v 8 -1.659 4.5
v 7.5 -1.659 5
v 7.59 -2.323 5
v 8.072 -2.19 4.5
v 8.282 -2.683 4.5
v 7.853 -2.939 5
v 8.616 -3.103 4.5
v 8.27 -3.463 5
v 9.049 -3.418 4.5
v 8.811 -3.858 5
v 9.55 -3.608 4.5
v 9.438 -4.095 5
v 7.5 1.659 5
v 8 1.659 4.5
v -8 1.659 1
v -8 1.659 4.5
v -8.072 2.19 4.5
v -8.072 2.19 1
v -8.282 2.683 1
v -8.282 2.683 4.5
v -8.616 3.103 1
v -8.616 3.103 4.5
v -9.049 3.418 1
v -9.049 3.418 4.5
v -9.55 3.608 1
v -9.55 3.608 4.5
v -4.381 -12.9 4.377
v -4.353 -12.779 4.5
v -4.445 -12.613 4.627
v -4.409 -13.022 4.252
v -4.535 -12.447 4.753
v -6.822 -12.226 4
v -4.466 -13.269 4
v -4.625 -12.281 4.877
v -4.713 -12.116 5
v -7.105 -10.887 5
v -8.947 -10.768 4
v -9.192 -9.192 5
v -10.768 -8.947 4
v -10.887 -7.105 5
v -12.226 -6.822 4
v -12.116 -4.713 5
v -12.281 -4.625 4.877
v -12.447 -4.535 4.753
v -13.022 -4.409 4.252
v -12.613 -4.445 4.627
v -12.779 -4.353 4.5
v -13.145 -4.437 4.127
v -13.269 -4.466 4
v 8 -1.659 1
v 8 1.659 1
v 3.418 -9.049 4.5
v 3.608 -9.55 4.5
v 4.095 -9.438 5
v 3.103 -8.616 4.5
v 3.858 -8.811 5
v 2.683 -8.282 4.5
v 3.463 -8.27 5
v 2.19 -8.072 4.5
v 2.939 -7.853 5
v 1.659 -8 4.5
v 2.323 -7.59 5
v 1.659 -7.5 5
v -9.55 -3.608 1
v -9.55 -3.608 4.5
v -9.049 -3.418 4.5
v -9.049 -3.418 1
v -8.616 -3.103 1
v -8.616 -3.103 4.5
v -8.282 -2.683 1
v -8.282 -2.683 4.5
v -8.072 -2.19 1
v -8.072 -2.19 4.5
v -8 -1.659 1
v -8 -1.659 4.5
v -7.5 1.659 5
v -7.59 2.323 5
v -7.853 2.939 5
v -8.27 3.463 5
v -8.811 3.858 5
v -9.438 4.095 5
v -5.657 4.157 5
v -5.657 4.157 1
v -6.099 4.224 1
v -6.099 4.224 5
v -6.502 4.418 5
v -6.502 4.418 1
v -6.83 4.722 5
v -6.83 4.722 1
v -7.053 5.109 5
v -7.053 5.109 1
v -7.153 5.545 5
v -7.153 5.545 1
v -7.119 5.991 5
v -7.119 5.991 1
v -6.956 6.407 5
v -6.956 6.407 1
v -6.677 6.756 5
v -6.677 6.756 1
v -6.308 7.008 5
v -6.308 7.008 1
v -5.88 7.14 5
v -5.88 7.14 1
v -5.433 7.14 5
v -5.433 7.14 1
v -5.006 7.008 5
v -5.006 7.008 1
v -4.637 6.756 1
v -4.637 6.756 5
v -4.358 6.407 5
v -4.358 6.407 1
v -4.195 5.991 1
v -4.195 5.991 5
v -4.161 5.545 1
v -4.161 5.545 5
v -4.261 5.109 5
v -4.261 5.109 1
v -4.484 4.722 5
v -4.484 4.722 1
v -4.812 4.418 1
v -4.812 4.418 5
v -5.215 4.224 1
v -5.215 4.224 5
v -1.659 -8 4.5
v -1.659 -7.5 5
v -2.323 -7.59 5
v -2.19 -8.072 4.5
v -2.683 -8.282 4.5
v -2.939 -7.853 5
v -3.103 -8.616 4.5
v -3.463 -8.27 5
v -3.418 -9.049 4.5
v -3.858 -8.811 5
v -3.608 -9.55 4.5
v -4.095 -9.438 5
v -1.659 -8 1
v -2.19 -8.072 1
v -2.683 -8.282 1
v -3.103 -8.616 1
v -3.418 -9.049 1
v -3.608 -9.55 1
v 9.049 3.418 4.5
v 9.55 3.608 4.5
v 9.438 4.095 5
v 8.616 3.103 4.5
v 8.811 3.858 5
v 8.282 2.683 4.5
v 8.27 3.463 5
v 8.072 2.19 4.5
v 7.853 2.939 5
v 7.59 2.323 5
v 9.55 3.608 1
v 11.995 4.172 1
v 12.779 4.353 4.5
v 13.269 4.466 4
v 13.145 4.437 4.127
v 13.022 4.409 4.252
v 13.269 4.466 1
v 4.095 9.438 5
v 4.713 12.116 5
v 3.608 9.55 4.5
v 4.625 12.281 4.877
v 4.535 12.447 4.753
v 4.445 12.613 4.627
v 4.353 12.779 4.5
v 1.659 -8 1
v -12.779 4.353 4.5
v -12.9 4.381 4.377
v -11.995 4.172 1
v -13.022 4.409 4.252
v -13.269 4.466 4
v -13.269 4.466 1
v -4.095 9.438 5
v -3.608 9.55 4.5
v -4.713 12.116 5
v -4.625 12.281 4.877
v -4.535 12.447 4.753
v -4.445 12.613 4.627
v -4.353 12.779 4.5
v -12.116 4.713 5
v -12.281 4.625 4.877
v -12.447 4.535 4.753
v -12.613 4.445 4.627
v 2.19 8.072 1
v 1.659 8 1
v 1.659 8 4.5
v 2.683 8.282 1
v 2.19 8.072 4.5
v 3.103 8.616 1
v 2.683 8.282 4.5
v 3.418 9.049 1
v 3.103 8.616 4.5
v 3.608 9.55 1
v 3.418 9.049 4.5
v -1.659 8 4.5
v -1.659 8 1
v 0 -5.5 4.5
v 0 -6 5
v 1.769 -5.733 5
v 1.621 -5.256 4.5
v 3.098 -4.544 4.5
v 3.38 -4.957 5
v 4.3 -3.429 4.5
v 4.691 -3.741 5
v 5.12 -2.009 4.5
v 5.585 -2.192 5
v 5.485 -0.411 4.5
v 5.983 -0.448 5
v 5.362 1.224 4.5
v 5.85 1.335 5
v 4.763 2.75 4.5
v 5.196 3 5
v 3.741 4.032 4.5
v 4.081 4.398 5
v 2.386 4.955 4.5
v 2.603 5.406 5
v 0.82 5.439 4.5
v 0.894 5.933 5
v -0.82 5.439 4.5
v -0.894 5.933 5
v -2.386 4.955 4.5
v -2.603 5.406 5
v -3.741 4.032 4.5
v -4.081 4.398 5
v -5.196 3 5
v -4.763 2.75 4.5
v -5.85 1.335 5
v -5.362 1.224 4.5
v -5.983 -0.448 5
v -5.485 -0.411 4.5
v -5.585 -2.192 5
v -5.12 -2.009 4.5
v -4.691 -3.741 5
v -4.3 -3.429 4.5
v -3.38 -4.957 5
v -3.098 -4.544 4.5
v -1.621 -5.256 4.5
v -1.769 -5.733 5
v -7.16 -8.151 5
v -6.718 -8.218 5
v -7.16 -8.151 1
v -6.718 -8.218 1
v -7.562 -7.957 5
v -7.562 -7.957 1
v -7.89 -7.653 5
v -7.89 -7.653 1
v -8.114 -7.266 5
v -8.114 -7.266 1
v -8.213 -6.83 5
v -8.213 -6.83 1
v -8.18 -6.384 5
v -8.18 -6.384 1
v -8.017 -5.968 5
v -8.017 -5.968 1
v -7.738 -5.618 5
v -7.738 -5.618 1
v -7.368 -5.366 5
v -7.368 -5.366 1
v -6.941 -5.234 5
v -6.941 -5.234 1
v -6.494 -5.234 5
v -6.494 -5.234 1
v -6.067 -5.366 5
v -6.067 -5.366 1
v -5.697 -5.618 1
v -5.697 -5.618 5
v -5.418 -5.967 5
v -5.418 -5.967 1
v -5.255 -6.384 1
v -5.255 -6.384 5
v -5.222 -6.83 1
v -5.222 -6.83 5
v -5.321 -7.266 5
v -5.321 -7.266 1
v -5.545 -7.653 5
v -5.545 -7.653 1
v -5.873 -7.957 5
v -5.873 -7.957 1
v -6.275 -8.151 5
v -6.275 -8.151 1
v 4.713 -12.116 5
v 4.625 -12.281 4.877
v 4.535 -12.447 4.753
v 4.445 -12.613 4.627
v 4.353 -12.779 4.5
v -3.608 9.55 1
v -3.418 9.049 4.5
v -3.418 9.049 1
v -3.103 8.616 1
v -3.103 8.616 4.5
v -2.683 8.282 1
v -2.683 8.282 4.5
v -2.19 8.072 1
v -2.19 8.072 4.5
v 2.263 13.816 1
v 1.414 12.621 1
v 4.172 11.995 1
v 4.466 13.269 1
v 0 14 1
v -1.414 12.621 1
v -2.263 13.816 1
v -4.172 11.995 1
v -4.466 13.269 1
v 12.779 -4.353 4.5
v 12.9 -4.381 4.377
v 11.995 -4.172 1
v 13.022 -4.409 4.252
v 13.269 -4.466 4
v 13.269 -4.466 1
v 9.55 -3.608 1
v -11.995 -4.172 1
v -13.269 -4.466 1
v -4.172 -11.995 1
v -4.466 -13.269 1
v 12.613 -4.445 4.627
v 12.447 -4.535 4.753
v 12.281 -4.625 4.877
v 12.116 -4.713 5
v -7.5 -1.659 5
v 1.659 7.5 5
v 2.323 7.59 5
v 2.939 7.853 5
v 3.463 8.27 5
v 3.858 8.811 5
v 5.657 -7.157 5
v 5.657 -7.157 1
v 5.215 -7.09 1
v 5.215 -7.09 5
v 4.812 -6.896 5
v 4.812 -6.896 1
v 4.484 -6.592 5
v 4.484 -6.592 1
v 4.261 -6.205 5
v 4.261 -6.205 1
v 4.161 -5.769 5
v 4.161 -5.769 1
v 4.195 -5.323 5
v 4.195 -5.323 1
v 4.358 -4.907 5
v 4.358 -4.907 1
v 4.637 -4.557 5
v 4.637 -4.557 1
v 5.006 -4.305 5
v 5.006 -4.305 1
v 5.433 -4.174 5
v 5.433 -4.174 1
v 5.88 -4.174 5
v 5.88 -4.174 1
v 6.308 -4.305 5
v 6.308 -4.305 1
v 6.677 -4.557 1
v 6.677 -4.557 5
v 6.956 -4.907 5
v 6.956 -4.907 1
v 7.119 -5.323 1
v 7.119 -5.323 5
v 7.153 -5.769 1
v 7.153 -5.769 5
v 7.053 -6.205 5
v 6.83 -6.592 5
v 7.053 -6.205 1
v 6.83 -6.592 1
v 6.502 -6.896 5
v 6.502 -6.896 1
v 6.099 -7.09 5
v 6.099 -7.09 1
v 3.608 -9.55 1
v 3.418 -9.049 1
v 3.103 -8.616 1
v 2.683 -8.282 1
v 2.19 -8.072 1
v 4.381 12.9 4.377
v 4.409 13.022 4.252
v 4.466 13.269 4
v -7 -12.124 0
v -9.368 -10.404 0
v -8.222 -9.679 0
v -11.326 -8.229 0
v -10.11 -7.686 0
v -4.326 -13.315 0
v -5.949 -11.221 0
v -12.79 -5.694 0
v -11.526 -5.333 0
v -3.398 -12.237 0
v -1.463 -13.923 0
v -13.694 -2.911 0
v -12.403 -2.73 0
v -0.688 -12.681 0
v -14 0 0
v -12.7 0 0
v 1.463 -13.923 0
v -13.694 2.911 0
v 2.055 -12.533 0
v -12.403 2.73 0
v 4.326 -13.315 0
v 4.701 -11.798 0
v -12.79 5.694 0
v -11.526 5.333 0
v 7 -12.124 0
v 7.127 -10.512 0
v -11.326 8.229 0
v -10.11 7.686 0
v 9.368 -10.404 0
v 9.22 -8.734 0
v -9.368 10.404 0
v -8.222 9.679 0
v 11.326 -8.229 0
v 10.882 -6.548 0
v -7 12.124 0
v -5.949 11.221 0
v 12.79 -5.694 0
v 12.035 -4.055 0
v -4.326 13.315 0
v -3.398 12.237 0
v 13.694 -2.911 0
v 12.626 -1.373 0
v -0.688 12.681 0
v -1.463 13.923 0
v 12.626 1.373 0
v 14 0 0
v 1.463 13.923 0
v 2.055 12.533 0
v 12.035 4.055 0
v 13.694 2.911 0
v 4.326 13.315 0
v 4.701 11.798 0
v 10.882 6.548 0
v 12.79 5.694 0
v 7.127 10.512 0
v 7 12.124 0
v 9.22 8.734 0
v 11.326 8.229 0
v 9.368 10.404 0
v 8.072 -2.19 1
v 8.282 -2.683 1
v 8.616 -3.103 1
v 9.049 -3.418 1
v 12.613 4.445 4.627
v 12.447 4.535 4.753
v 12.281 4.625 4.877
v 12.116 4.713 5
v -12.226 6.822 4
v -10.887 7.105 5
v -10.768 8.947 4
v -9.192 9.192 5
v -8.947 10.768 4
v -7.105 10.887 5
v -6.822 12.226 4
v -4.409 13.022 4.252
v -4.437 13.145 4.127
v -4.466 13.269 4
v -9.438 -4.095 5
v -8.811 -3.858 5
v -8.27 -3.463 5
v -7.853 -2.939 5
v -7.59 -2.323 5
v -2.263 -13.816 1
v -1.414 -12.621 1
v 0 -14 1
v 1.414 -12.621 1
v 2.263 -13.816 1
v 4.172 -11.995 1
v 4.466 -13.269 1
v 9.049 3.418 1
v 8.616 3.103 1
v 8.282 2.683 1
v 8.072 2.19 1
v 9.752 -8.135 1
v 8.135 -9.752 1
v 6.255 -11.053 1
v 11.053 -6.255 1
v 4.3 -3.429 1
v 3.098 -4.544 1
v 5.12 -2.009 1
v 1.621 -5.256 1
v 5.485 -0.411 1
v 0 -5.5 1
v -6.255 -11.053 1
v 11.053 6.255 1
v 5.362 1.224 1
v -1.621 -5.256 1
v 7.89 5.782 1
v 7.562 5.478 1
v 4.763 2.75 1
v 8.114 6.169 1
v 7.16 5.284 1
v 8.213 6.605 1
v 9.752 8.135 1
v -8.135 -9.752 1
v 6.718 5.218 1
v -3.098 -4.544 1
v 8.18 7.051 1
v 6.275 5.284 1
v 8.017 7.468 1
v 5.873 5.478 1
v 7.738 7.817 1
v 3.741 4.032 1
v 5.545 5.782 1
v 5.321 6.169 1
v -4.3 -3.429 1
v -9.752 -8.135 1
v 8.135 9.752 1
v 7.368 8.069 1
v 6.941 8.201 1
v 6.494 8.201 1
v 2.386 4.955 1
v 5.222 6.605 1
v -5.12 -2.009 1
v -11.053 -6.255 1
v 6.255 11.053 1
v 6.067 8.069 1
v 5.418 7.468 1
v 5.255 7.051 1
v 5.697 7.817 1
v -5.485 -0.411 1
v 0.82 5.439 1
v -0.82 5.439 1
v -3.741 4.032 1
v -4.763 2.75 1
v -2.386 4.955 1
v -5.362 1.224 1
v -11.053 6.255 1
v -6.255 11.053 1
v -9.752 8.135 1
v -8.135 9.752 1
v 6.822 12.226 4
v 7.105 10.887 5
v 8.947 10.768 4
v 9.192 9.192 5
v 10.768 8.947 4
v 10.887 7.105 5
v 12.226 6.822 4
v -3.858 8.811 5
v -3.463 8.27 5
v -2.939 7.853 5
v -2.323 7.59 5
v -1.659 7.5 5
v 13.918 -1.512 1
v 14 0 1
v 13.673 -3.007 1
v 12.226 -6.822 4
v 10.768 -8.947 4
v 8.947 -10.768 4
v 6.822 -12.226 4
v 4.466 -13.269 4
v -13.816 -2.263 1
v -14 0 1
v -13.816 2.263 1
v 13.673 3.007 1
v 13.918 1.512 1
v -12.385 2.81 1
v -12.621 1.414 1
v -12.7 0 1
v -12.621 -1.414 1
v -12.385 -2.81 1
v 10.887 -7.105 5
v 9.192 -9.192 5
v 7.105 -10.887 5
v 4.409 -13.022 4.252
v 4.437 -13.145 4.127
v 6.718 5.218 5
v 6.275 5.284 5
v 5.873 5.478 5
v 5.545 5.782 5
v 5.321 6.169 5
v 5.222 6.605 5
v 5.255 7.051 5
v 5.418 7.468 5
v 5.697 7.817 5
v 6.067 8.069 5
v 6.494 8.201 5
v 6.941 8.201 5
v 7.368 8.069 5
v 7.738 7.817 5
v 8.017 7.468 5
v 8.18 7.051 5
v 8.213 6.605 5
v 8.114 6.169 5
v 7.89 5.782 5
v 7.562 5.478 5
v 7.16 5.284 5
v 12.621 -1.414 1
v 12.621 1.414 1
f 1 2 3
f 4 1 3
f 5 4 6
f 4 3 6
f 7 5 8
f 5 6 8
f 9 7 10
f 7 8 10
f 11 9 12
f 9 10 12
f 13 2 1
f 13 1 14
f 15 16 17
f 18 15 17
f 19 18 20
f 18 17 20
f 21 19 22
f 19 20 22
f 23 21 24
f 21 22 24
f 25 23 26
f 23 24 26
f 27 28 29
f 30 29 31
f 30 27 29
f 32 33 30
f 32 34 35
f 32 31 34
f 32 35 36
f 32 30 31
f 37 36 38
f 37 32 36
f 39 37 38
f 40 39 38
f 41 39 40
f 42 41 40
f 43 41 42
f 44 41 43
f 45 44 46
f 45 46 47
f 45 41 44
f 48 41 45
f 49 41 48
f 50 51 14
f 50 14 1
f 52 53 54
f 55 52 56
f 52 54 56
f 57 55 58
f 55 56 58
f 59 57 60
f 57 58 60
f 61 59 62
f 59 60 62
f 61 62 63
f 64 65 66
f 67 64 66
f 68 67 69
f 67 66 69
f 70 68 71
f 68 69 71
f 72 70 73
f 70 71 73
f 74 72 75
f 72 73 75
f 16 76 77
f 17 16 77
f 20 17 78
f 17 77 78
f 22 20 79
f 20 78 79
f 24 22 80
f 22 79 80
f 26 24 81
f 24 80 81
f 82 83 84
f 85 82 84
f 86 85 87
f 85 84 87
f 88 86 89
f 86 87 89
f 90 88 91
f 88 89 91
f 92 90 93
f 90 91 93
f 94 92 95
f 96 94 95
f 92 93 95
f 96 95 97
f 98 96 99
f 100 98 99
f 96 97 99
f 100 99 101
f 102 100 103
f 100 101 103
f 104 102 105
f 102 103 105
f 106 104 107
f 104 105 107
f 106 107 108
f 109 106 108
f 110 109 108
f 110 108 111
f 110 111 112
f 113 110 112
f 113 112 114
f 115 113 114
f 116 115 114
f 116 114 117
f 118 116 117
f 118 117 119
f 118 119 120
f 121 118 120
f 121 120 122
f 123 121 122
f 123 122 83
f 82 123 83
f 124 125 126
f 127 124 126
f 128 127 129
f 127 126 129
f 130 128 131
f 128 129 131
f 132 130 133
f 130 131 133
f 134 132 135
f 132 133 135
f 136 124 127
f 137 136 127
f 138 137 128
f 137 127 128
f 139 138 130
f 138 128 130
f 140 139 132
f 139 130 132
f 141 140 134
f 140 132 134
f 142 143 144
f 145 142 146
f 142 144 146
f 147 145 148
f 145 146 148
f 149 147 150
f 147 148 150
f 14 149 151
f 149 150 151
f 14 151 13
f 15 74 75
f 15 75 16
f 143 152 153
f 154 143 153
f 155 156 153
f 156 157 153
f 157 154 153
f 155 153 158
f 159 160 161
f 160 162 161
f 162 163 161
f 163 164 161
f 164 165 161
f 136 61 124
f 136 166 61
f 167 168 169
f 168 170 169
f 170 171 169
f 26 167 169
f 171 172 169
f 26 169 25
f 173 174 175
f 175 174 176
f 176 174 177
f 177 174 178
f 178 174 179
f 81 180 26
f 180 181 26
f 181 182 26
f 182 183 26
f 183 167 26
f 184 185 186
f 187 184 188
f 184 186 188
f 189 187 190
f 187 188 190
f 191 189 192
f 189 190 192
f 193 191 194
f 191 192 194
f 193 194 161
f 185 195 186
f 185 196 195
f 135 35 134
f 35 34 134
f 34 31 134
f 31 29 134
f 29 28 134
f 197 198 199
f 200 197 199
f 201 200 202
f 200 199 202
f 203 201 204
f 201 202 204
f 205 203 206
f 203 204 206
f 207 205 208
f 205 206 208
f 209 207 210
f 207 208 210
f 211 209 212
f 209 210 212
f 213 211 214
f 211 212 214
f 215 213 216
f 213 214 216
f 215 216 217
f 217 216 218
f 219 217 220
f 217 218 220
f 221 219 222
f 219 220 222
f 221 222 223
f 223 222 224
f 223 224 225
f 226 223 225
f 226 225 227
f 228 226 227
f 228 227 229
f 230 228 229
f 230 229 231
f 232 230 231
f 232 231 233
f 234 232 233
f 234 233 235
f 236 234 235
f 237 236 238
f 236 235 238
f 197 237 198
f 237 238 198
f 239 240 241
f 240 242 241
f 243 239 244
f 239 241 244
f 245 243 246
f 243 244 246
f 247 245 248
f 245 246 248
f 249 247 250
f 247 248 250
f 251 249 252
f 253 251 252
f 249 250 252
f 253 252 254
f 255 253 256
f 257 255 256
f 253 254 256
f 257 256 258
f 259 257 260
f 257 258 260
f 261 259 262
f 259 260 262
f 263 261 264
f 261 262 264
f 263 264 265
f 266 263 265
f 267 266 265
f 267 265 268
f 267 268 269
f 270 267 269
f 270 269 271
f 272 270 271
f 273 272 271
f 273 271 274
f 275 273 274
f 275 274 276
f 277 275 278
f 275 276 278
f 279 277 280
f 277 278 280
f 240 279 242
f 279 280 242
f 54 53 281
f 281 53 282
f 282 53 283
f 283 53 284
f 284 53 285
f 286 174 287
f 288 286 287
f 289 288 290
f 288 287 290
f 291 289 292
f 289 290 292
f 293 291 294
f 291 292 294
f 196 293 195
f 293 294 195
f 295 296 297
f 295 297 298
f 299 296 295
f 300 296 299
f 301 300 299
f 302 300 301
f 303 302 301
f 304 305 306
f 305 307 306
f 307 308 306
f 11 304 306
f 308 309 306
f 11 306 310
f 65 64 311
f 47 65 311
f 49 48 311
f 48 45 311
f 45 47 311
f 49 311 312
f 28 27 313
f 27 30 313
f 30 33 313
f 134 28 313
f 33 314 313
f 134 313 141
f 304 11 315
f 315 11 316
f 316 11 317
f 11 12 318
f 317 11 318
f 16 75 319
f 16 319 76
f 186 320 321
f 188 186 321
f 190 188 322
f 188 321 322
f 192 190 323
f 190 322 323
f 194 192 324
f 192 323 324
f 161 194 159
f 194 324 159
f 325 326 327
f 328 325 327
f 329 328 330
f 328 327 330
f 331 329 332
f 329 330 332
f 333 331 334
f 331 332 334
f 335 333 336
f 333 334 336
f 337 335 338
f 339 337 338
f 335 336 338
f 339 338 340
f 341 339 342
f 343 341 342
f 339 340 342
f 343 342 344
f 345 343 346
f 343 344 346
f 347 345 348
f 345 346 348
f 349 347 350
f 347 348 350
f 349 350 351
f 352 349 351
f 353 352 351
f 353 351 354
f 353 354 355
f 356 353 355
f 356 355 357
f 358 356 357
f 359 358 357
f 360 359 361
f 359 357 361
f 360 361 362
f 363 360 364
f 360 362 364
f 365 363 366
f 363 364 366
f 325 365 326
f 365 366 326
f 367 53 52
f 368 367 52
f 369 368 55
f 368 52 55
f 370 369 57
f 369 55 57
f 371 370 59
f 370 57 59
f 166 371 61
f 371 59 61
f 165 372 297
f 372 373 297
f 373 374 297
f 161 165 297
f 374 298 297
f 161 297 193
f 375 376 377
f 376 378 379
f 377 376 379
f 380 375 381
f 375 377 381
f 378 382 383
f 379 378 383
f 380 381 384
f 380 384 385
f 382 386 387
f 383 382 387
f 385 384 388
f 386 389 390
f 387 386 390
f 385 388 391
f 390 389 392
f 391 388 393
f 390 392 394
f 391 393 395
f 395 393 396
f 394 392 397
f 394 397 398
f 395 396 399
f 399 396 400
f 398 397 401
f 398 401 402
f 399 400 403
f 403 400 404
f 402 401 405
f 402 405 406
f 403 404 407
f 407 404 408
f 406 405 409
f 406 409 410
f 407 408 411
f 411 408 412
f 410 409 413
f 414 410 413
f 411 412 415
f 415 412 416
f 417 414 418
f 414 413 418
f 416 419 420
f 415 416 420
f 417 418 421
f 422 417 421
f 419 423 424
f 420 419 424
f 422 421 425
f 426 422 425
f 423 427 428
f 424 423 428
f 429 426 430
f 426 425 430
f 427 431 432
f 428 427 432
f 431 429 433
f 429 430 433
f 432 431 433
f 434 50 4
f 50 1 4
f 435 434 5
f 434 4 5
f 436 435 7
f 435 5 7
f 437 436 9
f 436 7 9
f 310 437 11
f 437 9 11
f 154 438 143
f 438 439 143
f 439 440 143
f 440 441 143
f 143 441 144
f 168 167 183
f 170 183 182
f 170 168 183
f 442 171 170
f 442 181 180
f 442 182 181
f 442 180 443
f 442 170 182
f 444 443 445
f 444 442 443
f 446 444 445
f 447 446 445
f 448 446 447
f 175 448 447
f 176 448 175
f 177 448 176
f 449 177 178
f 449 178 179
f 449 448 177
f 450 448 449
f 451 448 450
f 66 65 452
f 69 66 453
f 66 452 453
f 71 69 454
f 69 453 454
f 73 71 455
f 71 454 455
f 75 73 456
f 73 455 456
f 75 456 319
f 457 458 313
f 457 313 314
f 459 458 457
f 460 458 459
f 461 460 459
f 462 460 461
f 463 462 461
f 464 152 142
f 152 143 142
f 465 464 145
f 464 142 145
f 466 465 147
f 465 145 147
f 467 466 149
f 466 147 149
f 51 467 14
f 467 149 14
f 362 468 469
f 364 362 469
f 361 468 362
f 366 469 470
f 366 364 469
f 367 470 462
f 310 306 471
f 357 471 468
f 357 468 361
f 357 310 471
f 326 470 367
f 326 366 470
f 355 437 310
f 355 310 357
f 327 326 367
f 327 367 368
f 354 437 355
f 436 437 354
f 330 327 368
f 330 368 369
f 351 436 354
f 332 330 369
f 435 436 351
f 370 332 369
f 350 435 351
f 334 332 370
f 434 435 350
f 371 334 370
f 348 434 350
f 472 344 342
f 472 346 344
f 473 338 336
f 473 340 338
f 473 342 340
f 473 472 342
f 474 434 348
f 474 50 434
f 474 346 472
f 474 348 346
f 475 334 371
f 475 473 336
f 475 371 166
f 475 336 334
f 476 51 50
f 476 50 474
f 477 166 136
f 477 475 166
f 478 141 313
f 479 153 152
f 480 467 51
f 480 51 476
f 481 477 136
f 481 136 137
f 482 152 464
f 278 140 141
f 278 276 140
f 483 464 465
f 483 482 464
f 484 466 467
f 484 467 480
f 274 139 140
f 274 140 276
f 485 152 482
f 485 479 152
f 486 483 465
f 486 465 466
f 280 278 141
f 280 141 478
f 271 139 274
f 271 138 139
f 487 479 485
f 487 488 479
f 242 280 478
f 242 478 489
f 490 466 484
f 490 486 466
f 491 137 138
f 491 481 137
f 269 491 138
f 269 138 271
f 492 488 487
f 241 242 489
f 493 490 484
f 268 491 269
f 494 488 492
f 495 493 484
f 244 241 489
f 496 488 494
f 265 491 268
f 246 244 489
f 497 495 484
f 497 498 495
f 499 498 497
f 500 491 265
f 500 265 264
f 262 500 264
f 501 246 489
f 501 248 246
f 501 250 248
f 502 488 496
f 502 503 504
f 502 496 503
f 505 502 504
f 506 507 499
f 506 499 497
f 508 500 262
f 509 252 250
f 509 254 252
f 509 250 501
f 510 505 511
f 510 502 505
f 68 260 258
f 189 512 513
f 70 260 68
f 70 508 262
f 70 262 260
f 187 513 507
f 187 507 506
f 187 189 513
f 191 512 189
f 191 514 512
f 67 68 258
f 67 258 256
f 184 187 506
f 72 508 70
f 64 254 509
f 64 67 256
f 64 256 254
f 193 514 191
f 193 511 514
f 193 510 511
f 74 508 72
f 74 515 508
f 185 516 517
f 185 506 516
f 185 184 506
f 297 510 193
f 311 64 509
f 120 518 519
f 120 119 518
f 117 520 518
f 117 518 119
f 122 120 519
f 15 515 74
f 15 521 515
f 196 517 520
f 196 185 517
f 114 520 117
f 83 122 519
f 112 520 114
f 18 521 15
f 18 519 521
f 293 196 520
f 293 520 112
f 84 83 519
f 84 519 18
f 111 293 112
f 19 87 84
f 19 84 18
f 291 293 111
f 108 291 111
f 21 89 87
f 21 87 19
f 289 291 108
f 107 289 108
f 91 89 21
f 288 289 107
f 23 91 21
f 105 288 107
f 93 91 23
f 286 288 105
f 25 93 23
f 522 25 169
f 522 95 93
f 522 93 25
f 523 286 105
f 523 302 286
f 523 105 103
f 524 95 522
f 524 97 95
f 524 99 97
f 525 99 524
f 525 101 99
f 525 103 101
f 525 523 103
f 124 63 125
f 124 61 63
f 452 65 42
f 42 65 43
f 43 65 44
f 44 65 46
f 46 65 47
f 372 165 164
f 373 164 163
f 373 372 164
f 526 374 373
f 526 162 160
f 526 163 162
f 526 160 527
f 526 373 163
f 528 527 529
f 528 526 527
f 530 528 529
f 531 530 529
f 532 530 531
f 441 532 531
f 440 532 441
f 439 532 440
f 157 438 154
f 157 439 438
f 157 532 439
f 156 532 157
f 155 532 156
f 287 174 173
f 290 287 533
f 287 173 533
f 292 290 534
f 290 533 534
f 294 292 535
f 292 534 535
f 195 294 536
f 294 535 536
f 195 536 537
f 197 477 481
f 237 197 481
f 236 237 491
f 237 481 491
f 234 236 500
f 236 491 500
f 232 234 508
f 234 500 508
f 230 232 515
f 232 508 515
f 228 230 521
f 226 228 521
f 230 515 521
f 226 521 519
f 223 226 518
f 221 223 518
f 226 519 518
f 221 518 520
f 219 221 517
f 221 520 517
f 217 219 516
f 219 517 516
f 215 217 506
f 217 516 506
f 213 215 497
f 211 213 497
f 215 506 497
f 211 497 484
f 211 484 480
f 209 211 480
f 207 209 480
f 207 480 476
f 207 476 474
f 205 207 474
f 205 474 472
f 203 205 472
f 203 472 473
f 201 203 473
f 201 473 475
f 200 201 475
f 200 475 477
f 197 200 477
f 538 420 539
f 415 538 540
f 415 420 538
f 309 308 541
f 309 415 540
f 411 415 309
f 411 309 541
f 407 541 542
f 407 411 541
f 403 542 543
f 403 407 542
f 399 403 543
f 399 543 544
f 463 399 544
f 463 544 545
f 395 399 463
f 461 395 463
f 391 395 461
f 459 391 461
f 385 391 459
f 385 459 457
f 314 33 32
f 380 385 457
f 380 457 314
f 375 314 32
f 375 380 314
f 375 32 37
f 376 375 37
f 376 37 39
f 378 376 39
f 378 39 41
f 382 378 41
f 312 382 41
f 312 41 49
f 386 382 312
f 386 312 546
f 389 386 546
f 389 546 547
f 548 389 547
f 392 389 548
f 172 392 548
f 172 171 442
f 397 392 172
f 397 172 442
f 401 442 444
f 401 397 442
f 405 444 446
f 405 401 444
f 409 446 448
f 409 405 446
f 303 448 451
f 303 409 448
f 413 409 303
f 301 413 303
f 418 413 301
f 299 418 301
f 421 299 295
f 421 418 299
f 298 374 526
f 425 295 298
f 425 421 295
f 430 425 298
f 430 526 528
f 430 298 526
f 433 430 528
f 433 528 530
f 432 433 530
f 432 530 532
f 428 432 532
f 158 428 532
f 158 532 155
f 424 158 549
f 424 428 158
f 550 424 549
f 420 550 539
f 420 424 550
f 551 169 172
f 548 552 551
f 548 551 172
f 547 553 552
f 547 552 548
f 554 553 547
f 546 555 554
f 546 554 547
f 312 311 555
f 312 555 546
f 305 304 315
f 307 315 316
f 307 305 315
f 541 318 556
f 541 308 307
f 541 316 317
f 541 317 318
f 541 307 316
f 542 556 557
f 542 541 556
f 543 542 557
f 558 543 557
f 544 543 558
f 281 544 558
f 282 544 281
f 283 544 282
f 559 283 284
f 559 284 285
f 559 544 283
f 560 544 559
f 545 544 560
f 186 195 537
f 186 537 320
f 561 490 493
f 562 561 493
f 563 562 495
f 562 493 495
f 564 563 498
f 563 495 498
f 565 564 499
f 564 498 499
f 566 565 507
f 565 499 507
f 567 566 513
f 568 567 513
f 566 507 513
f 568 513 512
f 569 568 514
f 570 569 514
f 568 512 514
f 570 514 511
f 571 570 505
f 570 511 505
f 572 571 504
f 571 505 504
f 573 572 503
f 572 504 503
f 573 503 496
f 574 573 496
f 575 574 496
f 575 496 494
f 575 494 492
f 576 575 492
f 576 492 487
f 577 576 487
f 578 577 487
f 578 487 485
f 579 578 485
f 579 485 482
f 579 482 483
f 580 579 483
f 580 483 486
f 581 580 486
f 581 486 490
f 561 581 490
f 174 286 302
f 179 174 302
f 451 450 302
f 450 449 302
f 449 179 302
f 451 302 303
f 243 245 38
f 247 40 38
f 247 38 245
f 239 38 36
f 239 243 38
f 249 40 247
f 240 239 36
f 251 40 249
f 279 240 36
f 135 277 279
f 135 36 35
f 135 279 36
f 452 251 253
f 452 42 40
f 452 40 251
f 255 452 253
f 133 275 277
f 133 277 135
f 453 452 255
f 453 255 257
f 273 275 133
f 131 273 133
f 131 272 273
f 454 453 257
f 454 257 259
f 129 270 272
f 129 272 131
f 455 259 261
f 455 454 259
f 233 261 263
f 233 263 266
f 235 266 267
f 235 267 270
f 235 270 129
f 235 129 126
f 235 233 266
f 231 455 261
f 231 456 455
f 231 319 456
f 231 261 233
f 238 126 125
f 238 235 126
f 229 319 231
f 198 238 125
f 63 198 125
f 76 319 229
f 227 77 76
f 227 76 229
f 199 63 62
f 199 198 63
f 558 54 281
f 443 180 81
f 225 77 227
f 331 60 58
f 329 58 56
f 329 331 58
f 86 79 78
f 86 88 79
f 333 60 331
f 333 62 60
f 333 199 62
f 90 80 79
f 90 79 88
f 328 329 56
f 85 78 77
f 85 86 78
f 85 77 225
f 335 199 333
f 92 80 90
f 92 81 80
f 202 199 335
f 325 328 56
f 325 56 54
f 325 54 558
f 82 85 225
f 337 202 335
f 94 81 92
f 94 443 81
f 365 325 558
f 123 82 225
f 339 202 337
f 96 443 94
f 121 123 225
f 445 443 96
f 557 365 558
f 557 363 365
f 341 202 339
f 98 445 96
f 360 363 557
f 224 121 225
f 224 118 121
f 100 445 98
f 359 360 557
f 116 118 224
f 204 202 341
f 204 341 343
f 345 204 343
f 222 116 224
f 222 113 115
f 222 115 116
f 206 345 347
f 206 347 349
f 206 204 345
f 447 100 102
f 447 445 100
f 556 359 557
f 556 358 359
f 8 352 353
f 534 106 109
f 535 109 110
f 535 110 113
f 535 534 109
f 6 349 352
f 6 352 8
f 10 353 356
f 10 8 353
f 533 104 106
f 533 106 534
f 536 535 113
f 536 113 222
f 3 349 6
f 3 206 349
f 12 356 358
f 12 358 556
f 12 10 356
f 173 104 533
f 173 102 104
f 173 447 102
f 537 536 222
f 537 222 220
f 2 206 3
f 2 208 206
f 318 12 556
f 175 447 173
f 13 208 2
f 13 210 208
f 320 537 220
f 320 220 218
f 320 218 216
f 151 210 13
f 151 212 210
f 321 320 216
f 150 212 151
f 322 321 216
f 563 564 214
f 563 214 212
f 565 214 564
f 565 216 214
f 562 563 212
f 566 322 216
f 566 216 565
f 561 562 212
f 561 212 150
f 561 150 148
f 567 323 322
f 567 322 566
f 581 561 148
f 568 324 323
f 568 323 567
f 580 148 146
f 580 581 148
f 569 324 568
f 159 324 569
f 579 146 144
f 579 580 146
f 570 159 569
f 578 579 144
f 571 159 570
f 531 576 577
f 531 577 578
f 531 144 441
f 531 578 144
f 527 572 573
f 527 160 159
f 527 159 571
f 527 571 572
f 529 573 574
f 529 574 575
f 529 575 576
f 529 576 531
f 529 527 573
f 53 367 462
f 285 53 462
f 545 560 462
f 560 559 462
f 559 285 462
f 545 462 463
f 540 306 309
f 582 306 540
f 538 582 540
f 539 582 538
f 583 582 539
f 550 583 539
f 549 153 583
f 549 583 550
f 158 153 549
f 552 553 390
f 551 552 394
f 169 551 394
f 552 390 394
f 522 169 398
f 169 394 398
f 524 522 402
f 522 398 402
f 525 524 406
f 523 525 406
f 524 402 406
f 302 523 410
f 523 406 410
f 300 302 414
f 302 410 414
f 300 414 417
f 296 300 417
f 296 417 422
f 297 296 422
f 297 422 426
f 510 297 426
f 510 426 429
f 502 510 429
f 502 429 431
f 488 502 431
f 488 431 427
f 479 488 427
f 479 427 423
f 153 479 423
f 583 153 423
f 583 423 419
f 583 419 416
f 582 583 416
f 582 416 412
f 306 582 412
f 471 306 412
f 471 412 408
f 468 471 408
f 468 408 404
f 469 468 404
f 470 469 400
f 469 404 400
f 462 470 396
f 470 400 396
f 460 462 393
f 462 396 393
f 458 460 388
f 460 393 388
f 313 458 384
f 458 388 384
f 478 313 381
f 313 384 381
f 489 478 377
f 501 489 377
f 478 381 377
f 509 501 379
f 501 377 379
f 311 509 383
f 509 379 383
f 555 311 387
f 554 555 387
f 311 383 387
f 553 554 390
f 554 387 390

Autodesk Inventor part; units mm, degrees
ref_plane "YZ Plane" through (0, 0, 0) normal (1, 0, 0) x (0, 1, 0)
ref_plane "XZ Plane" through (0, 0, 0) normal (0, 1, 0) x (-1, 0, 0)
sketch "Sketch1" plane through (0, 0, 0) normal (0, 0, 1) x (1, 0, 0)
  circle A0 centre (0, 0) radius 14
  dimension "d0" = 28
extrude "Extrusion1" add sketch "Sketch1" along normal blind 5
chamfer "Chamfer1" distance 1 angle 45 1 edges at (-14, 0, 5)
ref_plane "Work Plane1" through (0, 0, 1) normal (0, 0, 1) x (1, 0, 0)
sketch "Sketch2" plane through (0, 0, 1) normal (0, 0, 1) x (1, 0, 0)
  line L0 (8, 3.25) -> (8, -3.25)
  line L1 (8, 3.25) -> (14.5, 4.75)
  line L2 (14.5, 4.75) -> (14.5, -4.75)
  line L3 (14.5, -4.75) -> (8, -3.25)
  point P0 (0, 0)
  dimension "d7" = 8
  dimension "d8" = 6.5
  dimension "d9" = 3.25
  dimension "d10" = 9.5
  dimension "d11" = 4.75
  dimension "d12" = 6.5
extrude "Extrusion2" cut sketch "Sketch2" along normal blind 5
fillet "Fillet1" radius 2 2 edges at (8, 3.25, 3) (8, -3.25, 3)
chamfer "Chamfer2" distance 0.5 angle 45 5 edges at (10.9197, 3.9238, 5) (8.4348, 2.9041, 5) (8, 0, 5) (8.4348, -2.9041, 5) (10.9197, -3.9238, 5)
pattern_circular "Circular Pattern1" count 4 over 360 about axis through (0, 0, -10) along (0, 0, 1) of "Extrusion2", "Fillet1", "Chamfer2"
sketch "Sketch3" plane through (0, 0, 0) normal (0, 0, -1) x (-1, 0, 0)
  circle A0 centre (0, 0) radius 14 projected
  circle A1 centre (0, 0) radius 12.7
  dimension "d22" = 1.3
extrude "Extrusion3" cut sketch "Sketch3" against normal blind 1 contours A1
sketch "Sketch4" plane through (0, 0, 5) normal (0, 0, 1) x (1, 0, 0)
  arc A0 (-12.1156, -4.7129) -> (-4.7129, -12.1156) centre (0, 0) ccw projected
hole "Hole1" at (0, 0, 5) direction (0, 0, -1) diameter 11 end through all
chamfer "Chamfer3" distance 0.5 angle 45 1 edges at (0, 5.5, 5)
sketch "Sketch5" plane through (0, 0, 5) normal (0, 0, 1) x (1, 0, 0)
  line L0 (1.659, -7.5) -> (-1.659, -7.5) projected
  circle A0 centre (0, 0) radius 6 projected
  line L1 (0, 0) -> (-5.6569, 5.6569)
  line L2 (0, 0) -> (-17.4716, 0) construction
  line L3 (0, 0) -> (5.6569, -5.6569) construction
  line L4 (0, 0) -> (6.7175, 6.7175) construction
  line L5 (0, 0) -> (-6.7175, -6.7175) construction
  dimension "d35" = 8
  dimension "d36" = 45
  dimension "d37" = 8
  dimension "d38" = 9.5
  dimension "d39" = 9.5
hole "Hole2" at (-5.6569, 5.6569, 5) at (5.6569, -5.6569, 5) at (-6.7175, -6.7175, 5) at (6.7175, 6.7175, 5) direction (0, 0, -1) diameter 3 end through all
properties part number "base"
